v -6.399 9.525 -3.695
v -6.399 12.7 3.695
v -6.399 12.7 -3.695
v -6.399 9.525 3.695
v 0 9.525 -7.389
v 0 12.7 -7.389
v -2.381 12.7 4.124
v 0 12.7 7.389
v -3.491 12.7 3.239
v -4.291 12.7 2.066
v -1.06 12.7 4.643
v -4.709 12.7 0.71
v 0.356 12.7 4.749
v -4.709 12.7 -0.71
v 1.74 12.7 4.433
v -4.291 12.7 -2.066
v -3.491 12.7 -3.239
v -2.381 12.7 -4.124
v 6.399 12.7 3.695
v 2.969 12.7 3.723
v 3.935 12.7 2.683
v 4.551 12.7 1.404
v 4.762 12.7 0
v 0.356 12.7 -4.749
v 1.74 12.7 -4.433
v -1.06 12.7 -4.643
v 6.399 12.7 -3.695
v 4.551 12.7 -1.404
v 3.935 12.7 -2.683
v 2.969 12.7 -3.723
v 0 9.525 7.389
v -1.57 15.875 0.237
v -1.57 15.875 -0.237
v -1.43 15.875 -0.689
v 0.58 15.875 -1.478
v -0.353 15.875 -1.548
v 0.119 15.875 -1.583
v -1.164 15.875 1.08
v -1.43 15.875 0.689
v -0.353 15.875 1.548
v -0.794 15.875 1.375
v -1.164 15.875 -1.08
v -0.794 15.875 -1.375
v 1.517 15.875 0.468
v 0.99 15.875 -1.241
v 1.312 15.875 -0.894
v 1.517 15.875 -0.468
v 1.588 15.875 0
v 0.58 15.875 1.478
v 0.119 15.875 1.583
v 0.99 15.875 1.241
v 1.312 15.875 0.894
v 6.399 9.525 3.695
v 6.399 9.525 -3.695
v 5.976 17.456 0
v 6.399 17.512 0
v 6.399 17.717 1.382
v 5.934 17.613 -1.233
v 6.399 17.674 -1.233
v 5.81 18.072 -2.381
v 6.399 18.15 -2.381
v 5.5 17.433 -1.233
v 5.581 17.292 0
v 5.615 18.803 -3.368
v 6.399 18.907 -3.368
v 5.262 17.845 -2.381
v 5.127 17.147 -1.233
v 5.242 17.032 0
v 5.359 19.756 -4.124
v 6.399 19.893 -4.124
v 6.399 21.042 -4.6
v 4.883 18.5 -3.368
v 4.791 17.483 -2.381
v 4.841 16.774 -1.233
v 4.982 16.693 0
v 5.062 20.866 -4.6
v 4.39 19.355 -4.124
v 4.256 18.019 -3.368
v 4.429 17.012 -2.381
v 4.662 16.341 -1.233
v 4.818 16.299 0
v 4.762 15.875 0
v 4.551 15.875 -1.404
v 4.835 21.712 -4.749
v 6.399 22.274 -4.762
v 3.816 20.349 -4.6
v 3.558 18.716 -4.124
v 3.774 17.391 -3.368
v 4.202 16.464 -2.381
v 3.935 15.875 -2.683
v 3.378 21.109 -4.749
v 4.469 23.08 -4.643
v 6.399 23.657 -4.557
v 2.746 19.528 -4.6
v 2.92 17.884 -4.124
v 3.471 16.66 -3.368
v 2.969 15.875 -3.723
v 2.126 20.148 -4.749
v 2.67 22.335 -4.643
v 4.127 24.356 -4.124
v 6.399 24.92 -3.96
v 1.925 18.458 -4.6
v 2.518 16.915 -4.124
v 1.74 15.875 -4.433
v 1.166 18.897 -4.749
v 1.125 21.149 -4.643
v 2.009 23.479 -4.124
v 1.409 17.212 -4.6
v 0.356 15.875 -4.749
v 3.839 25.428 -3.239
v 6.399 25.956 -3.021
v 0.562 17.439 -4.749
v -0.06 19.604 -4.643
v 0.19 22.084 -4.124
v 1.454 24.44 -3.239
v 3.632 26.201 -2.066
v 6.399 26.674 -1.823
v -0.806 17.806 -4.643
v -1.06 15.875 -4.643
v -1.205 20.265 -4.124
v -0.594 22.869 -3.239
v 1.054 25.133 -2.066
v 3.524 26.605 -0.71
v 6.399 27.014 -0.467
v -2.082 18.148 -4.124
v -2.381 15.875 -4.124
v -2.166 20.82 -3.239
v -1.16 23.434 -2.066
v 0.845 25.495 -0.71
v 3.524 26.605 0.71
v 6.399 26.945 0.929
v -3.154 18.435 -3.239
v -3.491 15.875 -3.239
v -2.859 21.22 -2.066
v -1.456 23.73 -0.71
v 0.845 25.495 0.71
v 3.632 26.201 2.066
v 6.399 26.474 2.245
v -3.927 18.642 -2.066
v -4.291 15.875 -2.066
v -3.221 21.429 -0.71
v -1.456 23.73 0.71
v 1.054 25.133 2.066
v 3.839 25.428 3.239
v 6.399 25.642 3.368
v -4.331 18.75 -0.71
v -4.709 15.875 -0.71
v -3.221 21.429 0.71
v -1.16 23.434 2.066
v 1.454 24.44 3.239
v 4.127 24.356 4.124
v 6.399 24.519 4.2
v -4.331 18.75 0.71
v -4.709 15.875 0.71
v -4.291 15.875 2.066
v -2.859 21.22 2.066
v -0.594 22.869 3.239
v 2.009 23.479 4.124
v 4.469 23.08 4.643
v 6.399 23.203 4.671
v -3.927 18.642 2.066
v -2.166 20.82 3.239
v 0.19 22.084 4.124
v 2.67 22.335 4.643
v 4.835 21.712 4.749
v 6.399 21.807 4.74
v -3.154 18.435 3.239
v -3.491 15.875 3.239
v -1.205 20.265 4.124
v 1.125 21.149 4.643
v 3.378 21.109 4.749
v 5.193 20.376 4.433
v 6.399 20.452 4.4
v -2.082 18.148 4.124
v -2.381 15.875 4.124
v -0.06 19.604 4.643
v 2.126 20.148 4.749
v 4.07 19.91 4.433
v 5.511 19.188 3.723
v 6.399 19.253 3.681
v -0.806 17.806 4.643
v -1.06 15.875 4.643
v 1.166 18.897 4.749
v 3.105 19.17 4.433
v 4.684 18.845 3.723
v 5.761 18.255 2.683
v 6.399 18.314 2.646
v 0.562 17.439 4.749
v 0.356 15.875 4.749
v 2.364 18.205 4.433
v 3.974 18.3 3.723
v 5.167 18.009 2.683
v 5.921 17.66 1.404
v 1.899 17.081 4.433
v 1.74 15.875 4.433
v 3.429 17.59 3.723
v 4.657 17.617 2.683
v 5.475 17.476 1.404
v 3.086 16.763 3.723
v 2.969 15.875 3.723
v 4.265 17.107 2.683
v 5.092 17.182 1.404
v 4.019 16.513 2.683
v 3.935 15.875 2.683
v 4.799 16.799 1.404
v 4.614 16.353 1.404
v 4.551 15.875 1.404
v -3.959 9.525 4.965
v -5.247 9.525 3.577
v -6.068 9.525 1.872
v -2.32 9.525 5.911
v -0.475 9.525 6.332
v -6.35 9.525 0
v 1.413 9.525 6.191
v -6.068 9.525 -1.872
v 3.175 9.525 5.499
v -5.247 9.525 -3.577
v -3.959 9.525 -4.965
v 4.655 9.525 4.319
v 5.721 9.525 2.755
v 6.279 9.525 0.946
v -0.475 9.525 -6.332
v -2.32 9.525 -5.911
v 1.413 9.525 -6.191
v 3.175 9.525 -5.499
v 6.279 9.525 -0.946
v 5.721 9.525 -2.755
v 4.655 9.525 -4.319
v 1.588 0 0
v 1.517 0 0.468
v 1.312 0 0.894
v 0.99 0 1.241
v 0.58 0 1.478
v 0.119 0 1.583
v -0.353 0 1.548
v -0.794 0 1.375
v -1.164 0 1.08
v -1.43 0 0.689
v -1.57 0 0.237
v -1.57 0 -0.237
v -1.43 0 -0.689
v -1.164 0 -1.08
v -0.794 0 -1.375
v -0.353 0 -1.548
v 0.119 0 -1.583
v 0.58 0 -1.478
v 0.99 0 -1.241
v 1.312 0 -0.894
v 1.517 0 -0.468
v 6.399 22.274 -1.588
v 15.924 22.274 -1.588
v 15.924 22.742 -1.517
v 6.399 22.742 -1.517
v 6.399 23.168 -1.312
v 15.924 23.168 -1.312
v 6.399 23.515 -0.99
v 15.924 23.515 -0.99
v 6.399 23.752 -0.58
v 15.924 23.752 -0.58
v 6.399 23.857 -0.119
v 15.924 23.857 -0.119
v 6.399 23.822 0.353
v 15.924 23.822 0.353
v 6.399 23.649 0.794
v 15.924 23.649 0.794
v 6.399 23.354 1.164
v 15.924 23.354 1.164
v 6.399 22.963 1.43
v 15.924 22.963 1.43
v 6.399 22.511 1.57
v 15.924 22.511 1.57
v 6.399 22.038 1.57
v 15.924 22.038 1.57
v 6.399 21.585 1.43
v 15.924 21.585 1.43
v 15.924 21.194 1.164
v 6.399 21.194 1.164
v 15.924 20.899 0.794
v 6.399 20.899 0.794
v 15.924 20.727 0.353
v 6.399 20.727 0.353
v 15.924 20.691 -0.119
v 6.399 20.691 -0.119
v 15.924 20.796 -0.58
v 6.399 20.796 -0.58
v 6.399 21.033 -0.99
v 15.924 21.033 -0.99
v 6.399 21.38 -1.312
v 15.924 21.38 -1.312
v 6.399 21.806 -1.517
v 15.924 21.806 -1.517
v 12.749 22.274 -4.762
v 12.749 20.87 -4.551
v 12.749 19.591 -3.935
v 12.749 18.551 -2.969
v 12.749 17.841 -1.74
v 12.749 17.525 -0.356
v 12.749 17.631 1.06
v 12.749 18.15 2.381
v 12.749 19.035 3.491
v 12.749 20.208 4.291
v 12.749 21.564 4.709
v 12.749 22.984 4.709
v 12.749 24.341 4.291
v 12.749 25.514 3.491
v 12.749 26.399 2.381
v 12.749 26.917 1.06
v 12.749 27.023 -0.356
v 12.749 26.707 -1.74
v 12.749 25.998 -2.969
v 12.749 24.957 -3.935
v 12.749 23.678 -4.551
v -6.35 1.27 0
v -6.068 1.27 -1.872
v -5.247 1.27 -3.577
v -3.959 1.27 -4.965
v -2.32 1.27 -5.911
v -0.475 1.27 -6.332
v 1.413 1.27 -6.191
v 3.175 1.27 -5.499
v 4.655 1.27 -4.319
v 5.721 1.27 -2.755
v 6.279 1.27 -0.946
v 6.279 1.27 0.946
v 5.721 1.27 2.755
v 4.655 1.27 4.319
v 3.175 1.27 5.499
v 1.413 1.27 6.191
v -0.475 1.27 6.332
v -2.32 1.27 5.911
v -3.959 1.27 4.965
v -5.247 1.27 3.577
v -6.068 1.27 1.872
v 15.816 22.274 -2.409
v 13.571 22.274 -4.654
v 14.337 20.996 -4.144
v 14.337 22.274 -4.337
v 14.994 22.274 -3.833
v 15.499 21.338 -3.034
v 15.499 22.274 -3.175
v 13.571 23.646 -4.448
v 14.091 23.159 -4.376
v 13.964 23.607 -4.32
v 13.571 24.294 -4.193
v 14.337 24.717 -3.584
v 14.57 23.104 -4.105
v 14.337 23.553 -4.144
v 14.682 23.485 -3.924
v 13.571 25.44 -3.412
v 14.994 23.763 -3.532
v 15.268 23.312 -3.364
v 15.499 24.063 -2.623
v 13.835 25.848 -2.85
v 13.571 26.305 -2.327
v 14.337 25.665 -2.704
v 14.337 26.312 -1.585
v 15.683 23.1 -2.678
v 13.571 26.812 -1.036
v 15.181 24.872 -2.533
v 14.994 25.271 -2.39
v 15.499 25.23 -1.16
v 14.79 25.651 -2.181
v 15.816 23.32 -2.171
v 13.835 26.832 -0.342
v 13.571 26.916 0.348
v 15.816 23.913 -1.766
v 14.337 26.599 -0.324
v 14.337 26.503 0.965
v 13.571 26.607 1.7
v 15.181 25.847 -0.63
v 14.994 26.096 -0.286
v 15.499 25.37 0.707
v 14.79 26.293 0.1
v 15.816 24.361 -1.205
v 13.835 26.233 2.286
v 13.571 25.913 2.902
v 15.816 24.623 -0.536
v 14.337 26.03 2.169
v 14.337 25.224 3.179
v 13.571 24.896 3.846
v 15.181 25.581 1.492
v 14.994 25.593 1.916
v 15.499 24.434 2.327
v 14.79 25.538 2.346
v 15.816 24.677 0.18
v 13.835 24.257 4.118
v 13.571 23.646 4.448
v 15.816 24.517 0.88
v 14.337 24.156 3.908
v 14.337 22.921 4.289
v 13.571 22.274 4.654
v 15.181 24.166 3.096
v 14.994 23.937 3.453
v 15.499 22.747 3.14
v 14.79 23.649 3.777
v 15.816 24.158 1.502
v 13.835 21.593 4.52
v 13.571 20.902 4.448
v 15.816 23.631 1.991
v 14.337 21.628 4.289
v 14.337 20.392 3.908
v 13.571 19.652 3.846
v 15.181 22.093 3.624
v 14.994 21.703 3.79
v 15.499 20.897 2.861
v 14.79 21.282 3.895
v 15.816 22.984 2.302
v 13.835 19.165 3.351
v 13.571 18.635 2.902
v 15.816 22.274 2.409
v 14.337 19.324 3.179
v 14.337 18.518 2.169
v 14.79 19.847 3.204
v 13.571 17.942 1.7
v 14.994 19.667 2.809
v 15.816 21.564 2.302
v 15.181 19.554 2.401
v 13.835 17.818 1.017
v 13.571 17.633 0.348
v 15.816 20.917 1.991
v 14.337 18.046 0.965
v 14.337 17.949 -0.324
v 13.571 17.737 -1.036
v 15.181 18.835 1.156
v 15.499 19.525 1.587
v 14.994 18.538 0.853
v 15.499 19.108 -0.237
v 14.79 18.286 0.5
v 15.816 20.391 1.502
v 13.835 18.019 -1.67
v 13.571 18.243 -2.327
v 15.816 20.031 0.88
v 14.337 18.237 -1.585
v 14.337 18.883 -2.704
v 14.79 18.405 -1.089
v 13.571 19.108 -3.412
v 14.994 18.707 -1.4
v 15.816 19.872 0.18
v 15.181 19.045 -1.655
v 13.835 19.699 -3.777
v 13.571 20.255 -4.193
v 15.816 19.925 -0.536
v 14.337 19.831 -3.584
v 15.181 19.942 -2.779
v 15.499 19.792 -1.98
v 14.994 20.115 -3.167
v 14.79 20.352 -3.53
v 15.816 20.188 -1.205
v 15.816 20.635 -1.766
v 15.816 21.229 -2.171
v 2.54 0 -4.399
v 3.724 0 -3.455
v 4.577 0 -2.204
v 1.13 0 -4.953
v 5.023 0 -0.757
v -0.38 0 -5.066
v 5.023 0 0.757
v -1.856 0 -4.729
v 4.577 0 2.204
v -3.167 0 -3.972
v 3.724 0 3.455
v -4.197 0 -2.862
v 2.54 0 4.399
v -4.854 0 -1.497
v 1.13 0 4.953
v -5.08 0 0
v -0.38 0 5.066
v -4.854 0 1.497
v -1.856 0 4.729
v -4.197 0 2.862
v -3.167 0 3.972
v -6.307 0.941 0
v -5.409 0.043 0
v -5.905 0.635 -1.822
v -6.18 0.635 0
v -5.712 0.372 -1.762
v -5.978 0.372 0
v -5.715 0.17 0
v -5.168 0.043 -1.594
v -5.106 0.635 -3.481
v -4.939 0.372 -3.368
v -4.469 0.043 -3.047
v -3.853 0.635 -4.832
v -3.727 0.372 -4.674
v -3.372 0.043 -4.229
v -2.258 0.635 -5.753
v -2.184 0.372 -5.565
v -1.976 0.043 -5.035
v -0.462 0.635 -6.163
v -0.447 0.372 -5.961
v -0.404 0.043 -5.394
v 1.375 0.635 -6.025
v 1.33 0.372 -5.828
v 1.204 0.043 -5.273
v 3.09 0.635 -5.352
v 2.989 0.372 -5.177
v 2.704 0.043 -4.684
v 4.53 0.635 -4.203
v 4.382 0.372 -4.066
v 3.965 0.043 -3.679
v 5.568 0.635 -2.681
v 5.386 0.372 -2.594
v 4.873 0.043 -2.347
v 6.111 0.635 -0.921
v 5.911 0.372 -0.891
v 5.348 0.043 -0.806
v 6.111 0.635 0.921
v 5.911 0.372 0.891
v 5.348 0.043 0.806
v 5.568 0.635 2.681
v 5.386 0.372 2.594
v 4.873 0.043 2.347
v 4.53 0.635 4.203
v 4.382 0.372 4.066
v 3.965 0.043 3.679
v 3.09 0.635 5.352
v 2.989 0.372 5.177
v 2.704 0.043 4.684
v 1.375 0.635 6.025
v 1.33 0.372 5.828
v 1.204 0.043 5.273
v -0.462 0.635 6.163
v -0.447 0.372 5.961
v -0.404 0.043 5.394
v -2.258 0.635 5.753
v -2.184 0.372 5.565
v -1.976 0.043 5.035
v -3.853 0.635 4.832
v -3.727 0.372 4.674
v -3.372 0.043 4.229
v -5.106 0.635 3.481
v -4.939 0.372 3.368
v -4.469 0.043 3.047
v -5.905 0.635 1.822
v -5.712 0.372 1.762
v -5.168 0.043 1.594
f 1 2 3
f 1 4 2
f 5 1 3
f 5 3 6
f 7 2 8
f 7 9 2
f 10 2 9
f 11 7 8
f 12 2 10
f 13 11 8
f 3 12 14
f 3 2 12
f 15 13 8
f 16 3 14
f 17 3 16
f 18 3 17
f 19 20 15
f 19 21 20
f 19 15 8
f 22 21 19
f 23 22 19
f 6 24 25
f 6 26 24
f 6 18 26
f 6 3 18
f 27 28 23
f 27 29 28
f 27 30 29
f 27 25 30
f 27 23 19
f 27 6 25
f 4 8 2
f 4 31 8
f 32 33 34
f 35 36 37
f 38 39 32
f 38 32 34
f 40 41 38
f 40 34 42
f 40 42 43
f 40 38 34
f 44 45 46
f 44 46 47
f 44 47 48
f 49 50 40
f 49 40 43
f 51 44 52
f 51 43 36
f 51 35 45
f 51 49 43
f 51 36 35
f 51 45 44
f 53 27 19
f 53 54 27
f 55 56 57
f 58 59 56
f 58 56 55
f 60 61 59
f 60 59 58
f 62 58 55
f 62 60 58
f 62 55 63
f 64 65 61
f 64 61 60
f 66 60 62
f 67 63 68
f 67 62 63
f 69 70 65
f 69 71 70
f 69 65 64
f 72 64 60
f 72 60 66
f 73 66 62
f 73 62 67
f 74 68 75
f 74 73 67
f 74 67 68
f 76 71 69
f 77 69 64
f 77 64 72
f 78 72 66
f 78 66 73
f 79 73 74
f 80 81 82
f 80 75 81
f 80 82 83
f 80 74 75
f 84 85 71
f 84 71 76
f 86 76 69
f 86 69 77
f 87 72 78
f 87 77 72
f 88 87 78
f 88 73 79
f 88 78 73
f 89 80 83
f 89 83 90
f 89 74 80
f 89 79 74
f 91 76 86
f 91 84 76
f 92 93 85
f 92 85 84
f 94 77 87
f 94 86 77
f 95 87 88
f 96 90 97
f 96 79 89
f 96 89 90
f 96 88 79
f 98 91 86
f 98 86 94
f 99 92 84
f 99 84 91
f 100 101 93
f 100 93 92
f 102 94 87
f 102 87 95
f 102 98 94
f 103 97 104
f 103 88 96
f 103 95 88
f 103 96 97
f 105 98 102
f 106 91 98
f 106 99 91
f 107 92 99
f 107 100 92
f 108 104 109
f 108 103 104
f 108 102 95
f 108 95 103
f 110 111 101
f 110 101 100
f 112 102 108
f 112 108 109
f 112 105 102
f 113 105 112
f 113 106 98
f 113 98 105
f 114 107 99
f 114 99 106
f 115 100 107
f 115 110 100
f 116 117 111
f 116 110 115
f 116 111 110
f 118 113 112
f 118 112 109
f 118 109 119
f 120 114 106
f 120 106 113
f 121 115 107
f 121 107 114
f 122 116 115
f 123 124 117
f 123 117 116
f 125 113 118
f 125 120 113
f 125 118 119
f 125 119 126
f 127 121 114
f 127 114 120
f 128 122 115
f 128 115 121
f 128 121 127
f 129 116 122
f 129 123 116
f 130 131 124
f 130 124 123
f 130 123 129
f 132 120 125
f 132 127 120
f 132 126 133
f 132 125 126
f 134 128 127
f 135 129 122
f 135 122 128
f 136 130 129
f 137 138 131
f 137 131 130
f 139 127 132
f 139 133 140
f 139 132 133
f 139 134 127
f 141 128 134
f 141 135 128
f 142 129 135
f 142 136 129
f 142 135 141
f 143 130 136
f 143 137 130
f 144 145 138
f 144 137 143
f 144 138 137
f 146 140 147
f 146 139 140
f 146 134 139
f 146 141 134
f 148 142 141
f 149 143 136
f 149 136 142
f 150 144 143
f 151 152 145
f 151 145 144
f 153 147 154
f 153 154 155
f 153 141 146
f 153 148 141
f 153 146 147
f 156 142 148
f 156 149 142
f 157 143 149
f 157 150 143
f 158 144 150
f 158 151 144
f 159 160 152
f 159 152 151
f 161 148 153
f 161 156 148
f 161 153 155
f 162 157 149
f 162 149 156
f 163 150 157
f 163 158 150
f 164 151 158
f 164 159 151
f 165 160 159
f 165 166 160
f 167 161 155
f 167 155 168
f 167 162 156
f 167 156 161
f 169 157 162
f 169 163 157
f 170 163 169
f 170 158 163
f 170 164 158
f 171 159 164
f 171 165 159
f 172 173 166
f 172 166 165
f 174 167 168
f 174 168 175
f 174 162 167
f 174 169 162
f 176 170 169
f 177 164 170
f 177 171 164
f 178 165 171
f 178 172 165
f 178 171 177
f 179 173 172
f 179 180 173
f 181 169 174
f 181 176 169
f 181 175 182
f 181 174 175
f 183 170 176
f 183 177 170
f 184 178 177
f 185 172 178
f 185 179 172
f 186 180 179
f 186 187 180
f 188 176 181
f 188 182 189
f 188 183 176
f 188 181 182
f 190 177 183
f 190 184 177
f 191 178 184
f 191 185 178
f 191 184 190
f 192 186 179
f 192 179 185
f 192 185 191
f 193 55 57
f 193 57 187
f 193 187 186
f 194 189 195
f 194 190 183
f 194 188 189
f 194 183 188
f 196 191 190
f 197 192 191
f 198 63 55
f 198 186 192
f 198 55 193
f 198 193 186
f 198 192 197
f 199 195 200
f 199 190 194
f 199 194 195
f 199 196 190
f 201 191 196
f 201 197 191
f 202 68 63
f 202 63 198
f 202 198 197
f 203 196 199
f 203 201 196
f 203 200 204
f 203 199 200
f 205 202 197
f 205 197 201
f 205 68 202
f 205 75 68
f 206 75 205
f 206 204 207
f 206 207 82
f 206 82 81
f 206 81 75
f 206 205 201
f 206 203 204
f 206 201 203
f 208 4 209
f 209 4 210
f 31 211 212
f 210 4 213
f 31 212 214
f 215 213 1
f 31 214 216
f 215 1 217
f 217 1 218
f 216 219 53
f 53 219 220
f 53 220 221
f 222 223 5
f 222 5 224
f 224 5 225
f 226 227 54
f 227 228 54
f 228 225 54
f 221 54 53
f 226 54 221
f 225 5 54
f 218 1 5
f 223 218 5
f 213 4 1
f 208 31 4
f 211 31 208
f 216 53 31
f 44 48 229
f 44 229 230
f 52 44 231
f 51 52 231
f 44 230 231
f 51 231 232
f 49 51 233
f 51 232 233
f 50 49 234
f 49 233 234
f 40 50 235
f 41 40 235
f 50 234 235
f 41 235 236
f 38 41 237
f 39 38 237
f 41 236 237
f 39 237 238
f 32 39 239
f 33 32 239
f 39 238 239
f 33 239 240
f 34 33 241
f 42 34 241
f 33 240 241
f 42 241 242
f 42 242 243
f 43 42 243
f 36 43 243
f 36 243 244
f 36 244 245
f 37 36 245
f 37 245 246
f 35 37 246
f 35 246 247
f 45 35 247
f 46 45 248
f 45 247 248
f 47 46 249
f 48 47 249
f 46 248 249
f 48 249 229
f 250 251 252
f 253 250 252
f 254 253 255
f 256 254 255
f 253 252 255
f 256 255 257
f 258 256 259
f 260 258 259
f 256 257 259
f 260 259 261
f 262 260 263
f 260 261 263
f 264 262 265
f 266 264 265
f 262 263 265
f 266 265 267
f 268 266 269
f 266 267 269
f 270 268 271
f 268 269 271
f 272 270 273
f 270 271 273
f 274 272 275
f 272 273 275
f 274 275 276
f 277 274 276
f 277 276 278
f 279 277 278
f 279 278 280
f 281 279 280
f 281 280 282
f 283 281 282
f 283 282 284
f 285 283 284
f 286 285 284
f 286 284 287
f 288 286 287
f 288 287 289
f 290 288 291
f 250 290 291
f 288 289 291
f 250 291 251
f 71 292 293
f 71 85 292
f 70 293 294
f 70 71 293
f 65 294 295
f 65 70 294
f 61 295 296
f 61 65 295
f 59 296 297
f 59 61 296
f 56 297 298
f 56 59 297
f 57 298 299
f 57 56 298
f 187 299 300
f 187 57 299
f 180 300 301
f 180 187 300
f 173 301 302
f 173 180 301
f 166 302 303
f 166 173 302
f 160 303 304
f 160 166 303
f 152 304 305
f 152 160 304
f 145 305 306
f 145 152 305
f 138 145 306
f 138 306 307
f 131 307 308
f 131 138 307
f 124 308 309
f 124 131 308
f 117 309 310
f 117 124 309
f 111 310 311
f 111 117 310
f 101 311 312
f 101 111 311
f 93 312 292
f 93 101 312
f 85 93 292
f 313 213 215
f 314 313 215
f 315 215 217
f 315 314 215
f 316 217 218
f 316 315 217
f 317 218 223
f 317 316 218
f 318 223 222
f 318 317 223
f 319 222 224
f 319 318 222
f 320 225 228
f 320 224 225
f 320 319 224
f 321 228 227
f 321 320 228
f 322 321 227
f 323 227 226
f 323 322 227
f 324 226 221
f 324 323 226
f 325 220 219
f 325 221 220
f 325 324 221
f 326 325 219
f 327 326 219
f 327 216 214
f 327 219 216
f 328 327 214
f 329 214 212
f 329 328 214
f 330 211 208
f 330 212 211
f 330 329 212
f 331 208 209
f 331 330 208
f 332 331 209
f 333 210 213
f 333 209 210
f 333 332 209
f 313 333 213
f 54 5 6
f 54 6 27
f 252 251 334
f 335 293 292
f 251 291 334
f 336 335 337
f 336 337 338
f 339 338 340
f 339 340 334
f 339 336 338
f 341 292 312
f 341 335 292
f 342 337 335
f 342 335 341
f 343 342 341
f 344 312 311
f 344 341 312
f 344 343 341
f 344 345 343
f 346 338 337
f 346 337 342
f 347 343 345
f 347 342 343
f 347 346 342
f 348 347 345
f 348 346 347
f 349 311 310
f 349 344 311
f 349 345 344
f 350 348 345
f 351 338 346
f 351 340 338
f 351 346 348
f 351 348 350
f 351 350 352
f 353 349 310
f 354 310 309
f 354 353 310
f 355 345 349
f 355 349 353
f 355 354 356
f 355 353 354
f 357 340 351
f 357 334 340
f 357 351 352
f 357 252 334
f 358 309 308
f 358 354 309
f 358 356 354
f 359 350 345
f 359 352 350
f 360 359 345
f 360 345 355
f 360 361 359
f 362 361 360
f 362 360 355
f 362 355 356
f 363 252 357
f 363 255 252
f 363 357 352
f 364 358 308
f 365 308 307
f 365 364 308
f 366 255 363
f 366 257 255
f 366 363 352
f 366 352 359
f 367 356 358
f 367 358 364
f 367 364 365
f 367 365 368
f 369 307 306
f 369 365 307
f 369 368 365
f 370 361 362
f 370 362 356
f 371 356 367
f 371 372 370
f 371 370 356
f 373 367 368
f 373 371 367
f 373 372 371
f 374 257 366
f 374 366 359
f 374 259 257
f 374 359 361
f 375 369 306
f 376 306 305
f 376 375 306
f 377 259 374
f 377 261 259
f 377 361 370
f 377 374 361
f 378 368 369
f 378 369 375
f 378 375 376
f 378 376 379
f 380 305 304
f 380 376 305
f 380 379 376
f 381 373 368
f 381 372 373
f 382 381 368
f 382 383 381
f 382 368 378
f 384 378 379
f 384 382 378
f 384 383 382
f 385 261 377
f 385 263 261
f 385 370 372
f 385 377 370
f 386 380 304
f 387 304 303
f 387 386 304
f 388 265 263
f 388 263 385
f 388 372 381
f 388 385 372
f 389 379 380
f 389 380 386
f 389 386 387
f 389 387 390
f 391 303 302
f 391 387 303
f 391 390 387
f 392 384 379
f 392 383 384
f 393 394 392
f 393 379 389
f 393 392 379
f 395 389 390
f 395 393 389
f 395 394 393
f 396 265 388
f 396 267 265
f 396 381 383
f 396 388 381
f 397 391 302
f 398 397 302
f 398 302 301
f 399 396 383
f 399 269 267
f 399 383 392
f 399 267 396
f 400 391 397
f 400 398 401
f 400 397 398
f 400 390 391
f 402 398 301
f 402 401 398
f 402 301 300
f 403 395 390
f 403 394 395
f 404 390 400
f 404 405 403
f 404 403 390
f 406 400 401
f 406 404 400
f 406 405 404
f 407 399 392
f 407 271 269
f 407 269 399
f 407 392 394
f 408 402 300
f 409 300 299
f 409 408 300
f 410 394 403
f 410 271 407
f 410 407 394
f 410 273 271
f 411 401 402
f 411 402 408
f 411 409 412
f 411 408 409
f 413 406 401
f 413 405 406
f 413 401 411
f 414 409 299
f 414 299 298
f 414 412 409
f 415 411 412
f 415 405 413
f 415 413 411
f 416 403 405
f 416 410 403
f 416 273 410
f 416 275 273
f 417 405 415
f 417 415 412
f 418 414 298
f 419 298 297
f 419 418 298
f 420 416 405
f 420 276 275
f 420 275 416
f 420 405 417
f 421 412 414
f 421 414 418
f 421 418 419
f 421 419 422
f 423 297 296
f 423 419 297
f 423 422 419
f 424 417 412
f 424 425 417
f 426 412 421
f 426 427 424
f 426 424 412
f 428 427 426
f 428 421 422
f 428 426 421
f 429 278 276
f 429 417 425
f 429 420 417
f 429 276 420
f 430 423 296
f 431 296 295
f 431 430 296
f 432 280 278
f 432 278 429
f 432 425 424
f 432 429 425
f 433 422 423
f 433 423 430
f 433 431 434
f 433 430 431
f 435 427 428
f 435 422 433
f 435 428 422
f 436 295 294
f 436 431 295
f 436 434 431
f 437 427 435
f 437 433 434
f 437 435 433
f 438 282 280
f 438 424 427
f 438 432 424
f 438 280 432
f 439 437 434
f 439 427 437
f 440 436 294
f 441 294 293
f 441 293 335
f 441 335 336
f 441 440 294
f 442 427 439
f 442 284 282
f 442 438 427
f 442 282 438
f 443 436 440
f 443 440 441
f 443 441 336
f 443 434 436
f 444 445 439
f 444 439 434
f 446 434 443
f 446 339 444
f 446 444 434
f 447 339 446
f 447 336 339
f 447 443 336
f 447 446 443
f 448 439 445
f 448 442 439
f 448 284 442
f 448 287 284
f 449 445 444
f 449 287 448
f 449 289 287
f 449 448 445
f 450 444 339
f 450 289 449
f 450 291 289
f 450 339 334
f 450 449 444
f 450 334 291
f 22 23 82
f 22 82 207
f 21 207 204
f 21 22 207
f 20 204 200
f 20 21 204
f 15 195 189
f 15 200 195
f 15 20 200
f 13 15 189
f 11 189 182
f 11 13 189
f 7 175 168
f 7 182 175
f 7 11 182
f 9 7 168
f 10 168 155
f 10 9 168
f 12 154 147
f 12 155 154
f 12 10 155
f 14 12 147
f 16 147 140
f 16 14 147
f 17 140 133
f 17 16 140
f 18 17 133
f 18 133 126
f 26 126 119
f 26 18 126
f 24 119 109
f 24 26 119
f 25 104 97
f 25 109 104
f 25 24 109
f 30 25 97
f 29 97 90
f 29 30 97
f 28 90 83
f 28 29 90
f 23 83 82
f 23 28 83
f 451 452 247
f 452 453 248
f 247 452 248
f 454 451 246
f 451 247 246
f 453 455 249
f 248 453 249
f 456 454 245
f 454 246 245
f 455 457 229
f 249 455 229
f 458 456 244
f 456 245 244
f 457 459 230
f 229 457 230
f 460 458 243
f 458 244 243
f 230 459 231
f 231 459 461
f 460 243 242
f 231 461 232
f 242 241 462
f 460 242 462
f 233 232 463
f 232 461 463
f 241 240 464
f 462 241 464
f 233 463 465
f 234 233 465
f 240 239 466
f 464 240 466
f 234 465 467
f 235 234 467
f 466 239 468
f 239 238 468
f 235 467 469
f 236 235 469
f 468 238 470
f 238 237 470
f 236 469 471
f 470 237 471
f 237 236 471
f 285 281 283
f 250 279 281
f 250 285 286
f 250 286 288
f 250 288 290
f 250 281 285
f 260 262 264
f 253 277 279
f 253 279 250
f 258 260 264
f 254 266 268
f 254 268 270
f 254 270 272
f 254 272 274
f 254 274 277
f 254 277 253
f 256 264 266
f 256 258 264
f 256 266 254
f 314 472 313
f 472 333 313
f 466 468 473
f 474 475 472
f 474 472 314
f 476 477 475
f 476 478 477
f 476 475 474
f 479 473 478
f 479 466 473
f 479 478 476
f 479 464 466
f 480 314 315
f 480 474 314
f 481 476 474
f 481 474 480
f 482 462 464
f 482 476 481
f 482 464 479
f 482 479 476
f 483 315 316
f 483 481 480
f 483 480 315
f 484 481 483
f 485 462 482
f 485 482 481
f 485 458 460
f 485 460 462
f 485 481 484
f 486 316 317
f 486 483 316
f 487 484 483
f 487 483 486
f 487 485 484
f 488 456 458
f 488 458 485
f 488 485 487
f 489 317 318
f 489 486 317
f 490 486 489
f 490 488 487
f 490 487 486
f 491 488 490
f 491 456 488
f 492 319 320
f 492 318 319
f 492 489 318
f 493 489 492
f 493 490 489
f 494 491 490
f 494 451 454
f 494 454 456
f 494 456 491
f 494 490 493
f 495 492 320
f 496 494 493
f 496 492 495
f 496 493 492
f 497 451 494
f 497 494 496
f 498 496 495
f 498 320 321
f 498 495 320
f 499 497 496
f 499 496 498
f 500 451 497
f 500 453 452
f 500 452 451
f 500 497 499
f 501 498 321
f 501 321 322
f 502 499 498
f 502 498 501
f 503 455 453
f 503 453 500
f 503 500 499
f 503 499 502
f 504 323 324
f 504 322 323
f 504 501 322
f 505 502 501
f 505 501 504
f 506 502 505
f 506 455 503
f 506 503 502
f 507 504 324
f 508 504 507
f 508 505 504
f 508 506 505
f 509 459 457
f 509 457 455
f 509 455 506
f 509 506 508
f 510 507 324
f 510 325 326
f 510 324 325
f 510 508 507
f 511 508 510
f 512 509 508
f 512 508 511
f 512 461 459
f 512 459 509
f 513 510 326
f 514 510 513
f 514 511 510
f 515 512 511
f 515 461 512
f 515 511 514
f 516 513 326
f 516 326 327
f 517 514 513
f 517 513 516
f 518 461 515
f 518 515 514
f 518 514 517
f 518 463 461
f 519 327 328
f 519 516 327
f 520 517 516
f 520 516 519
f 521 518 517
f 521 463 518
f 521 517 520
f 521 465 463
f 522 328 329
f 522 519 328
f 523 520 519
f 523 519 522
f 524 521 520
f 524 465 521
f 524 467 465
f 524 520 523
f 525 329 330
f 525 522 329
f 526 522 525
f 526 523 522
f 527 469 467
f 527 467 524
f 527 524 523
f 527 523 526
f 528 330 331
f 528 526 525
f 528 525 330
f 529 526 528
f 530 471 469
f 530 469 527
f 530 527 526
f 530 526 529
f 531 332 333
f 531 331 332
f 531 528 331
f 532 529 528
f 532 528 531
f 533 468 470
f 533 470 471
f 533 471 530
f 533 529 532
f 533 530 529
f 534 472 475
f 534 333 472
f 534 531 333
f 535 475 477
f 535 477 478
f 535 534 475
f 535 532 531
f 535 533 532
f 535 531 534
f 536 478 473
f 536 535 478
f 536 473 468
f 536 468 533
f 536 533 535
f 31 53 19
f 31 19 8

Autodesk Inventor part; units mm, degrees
ref_plane "YZ Plane" through (0, 0, 0) normal (1, 0, 0) x (0, 1, 0)
ref_plane "XZ Plane" through (0, 0, 0) normal (0, 1, 0) x (-1, 0, 0)
ref_plane "XY Plane" through (0, 0, 0) normal (0, 0, 1) x (1, 0, 0)
sketch "Sketch1" plane through (0, 0, 0) normal (0, 1, 0) x (-1, 0, 0)
  circle A0 centre (0, 0) radius 6.35
  dimension "d0" = 12.7
extrude "Extrusion1" add sketch "Sketch1" along normal blind 9.525
sketch "Sketch2" plane through (0, 9.525, 0) normal (0, 1, 0) x (1, 0, 0)
  line L0 (0, 7.3892) -> (6.3992, 3.6946)
  line L1 (6.3992, 3.6946) -> (6.3992, -3.6946)
  line L2 (6.3992, -3.6946) -> (0, -7.3892)
  line L3 (0, -7.3892) -> (-6.3992, -3.6946)
  line L4 (-6.3992, -3.6946) -> (-6.3992, 3.6946)
  line L5 (-6.3992, 3.6946) -> (0, 7.3892)
  point P0 (0, 0)
  point P1 (0, 0)
extrude "Extrusion2" add sketch "Sketch2" along normal blind 3.175
thread "Thread1" size "1/2-13 UNC" class "2A" standard "ANSI Unified Screw Threads" full length
sketch "Sketch3" plane through (0, 12.7, 0) normal (0, 1, 0) x (1, 0, 0)
  circle A0 centre (0, 0) radius 4.7625
  dimension "d7" = 9.525
extrude "Extrusion3" add sketch "Sketch3" along normal blind 3.175
sketch "Sketch4" plane through (0, 15.875, 0) normal (0, 1, 0) x (1, 0, 0)
  circle A0 centre (0, 0) radius 4.7625
  line L0 (6.3992, -10.3449) -> (6.3992, 10.3449) projected
revolve "Revolution1" add sketch "Sketch4" angle 90 about axis through (6.3992, 15.875, 3.6946) along (0, 0, -1)
sketch "Sketch5" plane through (6.3992, 22.2742, 0) normal (1, 0, 0) x (0, 0, -1)
  circle A0 centre (0, 0) radius 4.7625 projected
  circle A1 centre (0, 0) radius 4.7625
  point P0 (0, -22.2742)
extrude "Extrusion4" add sketch "Sketch5" along normal blind 9.525
fillet "Fillet1" radius 3.175 1 edges at (15.9242, 22.2742, 4.7625)
sketch "Sketch6" plane through (15.9242, 22.2742, 0) normal (1, 0, 0) x (0, 0, -1)
  circle A0 centre (0, 0) radius 1.5875
  point P0 (0, -22.2742)
extrude "Extrusion5" cut sketch "Sketch6" against normal blind 9.525
sketch "Sketch7" plane through (0, 0, 0) normal (0, -1, 0) x (1, 0, 0)
  circle A0 centre (0, 0) radius 1.5875
  dimension "d16" = 3.175
extrude "Extrusion6" cut sketch "Sketch7" against normal blind 15.875
fillet "Fillet2" radius 1.27 1 edges at (6.35, 0, 0)
properties part number "Threaded Elbow"
